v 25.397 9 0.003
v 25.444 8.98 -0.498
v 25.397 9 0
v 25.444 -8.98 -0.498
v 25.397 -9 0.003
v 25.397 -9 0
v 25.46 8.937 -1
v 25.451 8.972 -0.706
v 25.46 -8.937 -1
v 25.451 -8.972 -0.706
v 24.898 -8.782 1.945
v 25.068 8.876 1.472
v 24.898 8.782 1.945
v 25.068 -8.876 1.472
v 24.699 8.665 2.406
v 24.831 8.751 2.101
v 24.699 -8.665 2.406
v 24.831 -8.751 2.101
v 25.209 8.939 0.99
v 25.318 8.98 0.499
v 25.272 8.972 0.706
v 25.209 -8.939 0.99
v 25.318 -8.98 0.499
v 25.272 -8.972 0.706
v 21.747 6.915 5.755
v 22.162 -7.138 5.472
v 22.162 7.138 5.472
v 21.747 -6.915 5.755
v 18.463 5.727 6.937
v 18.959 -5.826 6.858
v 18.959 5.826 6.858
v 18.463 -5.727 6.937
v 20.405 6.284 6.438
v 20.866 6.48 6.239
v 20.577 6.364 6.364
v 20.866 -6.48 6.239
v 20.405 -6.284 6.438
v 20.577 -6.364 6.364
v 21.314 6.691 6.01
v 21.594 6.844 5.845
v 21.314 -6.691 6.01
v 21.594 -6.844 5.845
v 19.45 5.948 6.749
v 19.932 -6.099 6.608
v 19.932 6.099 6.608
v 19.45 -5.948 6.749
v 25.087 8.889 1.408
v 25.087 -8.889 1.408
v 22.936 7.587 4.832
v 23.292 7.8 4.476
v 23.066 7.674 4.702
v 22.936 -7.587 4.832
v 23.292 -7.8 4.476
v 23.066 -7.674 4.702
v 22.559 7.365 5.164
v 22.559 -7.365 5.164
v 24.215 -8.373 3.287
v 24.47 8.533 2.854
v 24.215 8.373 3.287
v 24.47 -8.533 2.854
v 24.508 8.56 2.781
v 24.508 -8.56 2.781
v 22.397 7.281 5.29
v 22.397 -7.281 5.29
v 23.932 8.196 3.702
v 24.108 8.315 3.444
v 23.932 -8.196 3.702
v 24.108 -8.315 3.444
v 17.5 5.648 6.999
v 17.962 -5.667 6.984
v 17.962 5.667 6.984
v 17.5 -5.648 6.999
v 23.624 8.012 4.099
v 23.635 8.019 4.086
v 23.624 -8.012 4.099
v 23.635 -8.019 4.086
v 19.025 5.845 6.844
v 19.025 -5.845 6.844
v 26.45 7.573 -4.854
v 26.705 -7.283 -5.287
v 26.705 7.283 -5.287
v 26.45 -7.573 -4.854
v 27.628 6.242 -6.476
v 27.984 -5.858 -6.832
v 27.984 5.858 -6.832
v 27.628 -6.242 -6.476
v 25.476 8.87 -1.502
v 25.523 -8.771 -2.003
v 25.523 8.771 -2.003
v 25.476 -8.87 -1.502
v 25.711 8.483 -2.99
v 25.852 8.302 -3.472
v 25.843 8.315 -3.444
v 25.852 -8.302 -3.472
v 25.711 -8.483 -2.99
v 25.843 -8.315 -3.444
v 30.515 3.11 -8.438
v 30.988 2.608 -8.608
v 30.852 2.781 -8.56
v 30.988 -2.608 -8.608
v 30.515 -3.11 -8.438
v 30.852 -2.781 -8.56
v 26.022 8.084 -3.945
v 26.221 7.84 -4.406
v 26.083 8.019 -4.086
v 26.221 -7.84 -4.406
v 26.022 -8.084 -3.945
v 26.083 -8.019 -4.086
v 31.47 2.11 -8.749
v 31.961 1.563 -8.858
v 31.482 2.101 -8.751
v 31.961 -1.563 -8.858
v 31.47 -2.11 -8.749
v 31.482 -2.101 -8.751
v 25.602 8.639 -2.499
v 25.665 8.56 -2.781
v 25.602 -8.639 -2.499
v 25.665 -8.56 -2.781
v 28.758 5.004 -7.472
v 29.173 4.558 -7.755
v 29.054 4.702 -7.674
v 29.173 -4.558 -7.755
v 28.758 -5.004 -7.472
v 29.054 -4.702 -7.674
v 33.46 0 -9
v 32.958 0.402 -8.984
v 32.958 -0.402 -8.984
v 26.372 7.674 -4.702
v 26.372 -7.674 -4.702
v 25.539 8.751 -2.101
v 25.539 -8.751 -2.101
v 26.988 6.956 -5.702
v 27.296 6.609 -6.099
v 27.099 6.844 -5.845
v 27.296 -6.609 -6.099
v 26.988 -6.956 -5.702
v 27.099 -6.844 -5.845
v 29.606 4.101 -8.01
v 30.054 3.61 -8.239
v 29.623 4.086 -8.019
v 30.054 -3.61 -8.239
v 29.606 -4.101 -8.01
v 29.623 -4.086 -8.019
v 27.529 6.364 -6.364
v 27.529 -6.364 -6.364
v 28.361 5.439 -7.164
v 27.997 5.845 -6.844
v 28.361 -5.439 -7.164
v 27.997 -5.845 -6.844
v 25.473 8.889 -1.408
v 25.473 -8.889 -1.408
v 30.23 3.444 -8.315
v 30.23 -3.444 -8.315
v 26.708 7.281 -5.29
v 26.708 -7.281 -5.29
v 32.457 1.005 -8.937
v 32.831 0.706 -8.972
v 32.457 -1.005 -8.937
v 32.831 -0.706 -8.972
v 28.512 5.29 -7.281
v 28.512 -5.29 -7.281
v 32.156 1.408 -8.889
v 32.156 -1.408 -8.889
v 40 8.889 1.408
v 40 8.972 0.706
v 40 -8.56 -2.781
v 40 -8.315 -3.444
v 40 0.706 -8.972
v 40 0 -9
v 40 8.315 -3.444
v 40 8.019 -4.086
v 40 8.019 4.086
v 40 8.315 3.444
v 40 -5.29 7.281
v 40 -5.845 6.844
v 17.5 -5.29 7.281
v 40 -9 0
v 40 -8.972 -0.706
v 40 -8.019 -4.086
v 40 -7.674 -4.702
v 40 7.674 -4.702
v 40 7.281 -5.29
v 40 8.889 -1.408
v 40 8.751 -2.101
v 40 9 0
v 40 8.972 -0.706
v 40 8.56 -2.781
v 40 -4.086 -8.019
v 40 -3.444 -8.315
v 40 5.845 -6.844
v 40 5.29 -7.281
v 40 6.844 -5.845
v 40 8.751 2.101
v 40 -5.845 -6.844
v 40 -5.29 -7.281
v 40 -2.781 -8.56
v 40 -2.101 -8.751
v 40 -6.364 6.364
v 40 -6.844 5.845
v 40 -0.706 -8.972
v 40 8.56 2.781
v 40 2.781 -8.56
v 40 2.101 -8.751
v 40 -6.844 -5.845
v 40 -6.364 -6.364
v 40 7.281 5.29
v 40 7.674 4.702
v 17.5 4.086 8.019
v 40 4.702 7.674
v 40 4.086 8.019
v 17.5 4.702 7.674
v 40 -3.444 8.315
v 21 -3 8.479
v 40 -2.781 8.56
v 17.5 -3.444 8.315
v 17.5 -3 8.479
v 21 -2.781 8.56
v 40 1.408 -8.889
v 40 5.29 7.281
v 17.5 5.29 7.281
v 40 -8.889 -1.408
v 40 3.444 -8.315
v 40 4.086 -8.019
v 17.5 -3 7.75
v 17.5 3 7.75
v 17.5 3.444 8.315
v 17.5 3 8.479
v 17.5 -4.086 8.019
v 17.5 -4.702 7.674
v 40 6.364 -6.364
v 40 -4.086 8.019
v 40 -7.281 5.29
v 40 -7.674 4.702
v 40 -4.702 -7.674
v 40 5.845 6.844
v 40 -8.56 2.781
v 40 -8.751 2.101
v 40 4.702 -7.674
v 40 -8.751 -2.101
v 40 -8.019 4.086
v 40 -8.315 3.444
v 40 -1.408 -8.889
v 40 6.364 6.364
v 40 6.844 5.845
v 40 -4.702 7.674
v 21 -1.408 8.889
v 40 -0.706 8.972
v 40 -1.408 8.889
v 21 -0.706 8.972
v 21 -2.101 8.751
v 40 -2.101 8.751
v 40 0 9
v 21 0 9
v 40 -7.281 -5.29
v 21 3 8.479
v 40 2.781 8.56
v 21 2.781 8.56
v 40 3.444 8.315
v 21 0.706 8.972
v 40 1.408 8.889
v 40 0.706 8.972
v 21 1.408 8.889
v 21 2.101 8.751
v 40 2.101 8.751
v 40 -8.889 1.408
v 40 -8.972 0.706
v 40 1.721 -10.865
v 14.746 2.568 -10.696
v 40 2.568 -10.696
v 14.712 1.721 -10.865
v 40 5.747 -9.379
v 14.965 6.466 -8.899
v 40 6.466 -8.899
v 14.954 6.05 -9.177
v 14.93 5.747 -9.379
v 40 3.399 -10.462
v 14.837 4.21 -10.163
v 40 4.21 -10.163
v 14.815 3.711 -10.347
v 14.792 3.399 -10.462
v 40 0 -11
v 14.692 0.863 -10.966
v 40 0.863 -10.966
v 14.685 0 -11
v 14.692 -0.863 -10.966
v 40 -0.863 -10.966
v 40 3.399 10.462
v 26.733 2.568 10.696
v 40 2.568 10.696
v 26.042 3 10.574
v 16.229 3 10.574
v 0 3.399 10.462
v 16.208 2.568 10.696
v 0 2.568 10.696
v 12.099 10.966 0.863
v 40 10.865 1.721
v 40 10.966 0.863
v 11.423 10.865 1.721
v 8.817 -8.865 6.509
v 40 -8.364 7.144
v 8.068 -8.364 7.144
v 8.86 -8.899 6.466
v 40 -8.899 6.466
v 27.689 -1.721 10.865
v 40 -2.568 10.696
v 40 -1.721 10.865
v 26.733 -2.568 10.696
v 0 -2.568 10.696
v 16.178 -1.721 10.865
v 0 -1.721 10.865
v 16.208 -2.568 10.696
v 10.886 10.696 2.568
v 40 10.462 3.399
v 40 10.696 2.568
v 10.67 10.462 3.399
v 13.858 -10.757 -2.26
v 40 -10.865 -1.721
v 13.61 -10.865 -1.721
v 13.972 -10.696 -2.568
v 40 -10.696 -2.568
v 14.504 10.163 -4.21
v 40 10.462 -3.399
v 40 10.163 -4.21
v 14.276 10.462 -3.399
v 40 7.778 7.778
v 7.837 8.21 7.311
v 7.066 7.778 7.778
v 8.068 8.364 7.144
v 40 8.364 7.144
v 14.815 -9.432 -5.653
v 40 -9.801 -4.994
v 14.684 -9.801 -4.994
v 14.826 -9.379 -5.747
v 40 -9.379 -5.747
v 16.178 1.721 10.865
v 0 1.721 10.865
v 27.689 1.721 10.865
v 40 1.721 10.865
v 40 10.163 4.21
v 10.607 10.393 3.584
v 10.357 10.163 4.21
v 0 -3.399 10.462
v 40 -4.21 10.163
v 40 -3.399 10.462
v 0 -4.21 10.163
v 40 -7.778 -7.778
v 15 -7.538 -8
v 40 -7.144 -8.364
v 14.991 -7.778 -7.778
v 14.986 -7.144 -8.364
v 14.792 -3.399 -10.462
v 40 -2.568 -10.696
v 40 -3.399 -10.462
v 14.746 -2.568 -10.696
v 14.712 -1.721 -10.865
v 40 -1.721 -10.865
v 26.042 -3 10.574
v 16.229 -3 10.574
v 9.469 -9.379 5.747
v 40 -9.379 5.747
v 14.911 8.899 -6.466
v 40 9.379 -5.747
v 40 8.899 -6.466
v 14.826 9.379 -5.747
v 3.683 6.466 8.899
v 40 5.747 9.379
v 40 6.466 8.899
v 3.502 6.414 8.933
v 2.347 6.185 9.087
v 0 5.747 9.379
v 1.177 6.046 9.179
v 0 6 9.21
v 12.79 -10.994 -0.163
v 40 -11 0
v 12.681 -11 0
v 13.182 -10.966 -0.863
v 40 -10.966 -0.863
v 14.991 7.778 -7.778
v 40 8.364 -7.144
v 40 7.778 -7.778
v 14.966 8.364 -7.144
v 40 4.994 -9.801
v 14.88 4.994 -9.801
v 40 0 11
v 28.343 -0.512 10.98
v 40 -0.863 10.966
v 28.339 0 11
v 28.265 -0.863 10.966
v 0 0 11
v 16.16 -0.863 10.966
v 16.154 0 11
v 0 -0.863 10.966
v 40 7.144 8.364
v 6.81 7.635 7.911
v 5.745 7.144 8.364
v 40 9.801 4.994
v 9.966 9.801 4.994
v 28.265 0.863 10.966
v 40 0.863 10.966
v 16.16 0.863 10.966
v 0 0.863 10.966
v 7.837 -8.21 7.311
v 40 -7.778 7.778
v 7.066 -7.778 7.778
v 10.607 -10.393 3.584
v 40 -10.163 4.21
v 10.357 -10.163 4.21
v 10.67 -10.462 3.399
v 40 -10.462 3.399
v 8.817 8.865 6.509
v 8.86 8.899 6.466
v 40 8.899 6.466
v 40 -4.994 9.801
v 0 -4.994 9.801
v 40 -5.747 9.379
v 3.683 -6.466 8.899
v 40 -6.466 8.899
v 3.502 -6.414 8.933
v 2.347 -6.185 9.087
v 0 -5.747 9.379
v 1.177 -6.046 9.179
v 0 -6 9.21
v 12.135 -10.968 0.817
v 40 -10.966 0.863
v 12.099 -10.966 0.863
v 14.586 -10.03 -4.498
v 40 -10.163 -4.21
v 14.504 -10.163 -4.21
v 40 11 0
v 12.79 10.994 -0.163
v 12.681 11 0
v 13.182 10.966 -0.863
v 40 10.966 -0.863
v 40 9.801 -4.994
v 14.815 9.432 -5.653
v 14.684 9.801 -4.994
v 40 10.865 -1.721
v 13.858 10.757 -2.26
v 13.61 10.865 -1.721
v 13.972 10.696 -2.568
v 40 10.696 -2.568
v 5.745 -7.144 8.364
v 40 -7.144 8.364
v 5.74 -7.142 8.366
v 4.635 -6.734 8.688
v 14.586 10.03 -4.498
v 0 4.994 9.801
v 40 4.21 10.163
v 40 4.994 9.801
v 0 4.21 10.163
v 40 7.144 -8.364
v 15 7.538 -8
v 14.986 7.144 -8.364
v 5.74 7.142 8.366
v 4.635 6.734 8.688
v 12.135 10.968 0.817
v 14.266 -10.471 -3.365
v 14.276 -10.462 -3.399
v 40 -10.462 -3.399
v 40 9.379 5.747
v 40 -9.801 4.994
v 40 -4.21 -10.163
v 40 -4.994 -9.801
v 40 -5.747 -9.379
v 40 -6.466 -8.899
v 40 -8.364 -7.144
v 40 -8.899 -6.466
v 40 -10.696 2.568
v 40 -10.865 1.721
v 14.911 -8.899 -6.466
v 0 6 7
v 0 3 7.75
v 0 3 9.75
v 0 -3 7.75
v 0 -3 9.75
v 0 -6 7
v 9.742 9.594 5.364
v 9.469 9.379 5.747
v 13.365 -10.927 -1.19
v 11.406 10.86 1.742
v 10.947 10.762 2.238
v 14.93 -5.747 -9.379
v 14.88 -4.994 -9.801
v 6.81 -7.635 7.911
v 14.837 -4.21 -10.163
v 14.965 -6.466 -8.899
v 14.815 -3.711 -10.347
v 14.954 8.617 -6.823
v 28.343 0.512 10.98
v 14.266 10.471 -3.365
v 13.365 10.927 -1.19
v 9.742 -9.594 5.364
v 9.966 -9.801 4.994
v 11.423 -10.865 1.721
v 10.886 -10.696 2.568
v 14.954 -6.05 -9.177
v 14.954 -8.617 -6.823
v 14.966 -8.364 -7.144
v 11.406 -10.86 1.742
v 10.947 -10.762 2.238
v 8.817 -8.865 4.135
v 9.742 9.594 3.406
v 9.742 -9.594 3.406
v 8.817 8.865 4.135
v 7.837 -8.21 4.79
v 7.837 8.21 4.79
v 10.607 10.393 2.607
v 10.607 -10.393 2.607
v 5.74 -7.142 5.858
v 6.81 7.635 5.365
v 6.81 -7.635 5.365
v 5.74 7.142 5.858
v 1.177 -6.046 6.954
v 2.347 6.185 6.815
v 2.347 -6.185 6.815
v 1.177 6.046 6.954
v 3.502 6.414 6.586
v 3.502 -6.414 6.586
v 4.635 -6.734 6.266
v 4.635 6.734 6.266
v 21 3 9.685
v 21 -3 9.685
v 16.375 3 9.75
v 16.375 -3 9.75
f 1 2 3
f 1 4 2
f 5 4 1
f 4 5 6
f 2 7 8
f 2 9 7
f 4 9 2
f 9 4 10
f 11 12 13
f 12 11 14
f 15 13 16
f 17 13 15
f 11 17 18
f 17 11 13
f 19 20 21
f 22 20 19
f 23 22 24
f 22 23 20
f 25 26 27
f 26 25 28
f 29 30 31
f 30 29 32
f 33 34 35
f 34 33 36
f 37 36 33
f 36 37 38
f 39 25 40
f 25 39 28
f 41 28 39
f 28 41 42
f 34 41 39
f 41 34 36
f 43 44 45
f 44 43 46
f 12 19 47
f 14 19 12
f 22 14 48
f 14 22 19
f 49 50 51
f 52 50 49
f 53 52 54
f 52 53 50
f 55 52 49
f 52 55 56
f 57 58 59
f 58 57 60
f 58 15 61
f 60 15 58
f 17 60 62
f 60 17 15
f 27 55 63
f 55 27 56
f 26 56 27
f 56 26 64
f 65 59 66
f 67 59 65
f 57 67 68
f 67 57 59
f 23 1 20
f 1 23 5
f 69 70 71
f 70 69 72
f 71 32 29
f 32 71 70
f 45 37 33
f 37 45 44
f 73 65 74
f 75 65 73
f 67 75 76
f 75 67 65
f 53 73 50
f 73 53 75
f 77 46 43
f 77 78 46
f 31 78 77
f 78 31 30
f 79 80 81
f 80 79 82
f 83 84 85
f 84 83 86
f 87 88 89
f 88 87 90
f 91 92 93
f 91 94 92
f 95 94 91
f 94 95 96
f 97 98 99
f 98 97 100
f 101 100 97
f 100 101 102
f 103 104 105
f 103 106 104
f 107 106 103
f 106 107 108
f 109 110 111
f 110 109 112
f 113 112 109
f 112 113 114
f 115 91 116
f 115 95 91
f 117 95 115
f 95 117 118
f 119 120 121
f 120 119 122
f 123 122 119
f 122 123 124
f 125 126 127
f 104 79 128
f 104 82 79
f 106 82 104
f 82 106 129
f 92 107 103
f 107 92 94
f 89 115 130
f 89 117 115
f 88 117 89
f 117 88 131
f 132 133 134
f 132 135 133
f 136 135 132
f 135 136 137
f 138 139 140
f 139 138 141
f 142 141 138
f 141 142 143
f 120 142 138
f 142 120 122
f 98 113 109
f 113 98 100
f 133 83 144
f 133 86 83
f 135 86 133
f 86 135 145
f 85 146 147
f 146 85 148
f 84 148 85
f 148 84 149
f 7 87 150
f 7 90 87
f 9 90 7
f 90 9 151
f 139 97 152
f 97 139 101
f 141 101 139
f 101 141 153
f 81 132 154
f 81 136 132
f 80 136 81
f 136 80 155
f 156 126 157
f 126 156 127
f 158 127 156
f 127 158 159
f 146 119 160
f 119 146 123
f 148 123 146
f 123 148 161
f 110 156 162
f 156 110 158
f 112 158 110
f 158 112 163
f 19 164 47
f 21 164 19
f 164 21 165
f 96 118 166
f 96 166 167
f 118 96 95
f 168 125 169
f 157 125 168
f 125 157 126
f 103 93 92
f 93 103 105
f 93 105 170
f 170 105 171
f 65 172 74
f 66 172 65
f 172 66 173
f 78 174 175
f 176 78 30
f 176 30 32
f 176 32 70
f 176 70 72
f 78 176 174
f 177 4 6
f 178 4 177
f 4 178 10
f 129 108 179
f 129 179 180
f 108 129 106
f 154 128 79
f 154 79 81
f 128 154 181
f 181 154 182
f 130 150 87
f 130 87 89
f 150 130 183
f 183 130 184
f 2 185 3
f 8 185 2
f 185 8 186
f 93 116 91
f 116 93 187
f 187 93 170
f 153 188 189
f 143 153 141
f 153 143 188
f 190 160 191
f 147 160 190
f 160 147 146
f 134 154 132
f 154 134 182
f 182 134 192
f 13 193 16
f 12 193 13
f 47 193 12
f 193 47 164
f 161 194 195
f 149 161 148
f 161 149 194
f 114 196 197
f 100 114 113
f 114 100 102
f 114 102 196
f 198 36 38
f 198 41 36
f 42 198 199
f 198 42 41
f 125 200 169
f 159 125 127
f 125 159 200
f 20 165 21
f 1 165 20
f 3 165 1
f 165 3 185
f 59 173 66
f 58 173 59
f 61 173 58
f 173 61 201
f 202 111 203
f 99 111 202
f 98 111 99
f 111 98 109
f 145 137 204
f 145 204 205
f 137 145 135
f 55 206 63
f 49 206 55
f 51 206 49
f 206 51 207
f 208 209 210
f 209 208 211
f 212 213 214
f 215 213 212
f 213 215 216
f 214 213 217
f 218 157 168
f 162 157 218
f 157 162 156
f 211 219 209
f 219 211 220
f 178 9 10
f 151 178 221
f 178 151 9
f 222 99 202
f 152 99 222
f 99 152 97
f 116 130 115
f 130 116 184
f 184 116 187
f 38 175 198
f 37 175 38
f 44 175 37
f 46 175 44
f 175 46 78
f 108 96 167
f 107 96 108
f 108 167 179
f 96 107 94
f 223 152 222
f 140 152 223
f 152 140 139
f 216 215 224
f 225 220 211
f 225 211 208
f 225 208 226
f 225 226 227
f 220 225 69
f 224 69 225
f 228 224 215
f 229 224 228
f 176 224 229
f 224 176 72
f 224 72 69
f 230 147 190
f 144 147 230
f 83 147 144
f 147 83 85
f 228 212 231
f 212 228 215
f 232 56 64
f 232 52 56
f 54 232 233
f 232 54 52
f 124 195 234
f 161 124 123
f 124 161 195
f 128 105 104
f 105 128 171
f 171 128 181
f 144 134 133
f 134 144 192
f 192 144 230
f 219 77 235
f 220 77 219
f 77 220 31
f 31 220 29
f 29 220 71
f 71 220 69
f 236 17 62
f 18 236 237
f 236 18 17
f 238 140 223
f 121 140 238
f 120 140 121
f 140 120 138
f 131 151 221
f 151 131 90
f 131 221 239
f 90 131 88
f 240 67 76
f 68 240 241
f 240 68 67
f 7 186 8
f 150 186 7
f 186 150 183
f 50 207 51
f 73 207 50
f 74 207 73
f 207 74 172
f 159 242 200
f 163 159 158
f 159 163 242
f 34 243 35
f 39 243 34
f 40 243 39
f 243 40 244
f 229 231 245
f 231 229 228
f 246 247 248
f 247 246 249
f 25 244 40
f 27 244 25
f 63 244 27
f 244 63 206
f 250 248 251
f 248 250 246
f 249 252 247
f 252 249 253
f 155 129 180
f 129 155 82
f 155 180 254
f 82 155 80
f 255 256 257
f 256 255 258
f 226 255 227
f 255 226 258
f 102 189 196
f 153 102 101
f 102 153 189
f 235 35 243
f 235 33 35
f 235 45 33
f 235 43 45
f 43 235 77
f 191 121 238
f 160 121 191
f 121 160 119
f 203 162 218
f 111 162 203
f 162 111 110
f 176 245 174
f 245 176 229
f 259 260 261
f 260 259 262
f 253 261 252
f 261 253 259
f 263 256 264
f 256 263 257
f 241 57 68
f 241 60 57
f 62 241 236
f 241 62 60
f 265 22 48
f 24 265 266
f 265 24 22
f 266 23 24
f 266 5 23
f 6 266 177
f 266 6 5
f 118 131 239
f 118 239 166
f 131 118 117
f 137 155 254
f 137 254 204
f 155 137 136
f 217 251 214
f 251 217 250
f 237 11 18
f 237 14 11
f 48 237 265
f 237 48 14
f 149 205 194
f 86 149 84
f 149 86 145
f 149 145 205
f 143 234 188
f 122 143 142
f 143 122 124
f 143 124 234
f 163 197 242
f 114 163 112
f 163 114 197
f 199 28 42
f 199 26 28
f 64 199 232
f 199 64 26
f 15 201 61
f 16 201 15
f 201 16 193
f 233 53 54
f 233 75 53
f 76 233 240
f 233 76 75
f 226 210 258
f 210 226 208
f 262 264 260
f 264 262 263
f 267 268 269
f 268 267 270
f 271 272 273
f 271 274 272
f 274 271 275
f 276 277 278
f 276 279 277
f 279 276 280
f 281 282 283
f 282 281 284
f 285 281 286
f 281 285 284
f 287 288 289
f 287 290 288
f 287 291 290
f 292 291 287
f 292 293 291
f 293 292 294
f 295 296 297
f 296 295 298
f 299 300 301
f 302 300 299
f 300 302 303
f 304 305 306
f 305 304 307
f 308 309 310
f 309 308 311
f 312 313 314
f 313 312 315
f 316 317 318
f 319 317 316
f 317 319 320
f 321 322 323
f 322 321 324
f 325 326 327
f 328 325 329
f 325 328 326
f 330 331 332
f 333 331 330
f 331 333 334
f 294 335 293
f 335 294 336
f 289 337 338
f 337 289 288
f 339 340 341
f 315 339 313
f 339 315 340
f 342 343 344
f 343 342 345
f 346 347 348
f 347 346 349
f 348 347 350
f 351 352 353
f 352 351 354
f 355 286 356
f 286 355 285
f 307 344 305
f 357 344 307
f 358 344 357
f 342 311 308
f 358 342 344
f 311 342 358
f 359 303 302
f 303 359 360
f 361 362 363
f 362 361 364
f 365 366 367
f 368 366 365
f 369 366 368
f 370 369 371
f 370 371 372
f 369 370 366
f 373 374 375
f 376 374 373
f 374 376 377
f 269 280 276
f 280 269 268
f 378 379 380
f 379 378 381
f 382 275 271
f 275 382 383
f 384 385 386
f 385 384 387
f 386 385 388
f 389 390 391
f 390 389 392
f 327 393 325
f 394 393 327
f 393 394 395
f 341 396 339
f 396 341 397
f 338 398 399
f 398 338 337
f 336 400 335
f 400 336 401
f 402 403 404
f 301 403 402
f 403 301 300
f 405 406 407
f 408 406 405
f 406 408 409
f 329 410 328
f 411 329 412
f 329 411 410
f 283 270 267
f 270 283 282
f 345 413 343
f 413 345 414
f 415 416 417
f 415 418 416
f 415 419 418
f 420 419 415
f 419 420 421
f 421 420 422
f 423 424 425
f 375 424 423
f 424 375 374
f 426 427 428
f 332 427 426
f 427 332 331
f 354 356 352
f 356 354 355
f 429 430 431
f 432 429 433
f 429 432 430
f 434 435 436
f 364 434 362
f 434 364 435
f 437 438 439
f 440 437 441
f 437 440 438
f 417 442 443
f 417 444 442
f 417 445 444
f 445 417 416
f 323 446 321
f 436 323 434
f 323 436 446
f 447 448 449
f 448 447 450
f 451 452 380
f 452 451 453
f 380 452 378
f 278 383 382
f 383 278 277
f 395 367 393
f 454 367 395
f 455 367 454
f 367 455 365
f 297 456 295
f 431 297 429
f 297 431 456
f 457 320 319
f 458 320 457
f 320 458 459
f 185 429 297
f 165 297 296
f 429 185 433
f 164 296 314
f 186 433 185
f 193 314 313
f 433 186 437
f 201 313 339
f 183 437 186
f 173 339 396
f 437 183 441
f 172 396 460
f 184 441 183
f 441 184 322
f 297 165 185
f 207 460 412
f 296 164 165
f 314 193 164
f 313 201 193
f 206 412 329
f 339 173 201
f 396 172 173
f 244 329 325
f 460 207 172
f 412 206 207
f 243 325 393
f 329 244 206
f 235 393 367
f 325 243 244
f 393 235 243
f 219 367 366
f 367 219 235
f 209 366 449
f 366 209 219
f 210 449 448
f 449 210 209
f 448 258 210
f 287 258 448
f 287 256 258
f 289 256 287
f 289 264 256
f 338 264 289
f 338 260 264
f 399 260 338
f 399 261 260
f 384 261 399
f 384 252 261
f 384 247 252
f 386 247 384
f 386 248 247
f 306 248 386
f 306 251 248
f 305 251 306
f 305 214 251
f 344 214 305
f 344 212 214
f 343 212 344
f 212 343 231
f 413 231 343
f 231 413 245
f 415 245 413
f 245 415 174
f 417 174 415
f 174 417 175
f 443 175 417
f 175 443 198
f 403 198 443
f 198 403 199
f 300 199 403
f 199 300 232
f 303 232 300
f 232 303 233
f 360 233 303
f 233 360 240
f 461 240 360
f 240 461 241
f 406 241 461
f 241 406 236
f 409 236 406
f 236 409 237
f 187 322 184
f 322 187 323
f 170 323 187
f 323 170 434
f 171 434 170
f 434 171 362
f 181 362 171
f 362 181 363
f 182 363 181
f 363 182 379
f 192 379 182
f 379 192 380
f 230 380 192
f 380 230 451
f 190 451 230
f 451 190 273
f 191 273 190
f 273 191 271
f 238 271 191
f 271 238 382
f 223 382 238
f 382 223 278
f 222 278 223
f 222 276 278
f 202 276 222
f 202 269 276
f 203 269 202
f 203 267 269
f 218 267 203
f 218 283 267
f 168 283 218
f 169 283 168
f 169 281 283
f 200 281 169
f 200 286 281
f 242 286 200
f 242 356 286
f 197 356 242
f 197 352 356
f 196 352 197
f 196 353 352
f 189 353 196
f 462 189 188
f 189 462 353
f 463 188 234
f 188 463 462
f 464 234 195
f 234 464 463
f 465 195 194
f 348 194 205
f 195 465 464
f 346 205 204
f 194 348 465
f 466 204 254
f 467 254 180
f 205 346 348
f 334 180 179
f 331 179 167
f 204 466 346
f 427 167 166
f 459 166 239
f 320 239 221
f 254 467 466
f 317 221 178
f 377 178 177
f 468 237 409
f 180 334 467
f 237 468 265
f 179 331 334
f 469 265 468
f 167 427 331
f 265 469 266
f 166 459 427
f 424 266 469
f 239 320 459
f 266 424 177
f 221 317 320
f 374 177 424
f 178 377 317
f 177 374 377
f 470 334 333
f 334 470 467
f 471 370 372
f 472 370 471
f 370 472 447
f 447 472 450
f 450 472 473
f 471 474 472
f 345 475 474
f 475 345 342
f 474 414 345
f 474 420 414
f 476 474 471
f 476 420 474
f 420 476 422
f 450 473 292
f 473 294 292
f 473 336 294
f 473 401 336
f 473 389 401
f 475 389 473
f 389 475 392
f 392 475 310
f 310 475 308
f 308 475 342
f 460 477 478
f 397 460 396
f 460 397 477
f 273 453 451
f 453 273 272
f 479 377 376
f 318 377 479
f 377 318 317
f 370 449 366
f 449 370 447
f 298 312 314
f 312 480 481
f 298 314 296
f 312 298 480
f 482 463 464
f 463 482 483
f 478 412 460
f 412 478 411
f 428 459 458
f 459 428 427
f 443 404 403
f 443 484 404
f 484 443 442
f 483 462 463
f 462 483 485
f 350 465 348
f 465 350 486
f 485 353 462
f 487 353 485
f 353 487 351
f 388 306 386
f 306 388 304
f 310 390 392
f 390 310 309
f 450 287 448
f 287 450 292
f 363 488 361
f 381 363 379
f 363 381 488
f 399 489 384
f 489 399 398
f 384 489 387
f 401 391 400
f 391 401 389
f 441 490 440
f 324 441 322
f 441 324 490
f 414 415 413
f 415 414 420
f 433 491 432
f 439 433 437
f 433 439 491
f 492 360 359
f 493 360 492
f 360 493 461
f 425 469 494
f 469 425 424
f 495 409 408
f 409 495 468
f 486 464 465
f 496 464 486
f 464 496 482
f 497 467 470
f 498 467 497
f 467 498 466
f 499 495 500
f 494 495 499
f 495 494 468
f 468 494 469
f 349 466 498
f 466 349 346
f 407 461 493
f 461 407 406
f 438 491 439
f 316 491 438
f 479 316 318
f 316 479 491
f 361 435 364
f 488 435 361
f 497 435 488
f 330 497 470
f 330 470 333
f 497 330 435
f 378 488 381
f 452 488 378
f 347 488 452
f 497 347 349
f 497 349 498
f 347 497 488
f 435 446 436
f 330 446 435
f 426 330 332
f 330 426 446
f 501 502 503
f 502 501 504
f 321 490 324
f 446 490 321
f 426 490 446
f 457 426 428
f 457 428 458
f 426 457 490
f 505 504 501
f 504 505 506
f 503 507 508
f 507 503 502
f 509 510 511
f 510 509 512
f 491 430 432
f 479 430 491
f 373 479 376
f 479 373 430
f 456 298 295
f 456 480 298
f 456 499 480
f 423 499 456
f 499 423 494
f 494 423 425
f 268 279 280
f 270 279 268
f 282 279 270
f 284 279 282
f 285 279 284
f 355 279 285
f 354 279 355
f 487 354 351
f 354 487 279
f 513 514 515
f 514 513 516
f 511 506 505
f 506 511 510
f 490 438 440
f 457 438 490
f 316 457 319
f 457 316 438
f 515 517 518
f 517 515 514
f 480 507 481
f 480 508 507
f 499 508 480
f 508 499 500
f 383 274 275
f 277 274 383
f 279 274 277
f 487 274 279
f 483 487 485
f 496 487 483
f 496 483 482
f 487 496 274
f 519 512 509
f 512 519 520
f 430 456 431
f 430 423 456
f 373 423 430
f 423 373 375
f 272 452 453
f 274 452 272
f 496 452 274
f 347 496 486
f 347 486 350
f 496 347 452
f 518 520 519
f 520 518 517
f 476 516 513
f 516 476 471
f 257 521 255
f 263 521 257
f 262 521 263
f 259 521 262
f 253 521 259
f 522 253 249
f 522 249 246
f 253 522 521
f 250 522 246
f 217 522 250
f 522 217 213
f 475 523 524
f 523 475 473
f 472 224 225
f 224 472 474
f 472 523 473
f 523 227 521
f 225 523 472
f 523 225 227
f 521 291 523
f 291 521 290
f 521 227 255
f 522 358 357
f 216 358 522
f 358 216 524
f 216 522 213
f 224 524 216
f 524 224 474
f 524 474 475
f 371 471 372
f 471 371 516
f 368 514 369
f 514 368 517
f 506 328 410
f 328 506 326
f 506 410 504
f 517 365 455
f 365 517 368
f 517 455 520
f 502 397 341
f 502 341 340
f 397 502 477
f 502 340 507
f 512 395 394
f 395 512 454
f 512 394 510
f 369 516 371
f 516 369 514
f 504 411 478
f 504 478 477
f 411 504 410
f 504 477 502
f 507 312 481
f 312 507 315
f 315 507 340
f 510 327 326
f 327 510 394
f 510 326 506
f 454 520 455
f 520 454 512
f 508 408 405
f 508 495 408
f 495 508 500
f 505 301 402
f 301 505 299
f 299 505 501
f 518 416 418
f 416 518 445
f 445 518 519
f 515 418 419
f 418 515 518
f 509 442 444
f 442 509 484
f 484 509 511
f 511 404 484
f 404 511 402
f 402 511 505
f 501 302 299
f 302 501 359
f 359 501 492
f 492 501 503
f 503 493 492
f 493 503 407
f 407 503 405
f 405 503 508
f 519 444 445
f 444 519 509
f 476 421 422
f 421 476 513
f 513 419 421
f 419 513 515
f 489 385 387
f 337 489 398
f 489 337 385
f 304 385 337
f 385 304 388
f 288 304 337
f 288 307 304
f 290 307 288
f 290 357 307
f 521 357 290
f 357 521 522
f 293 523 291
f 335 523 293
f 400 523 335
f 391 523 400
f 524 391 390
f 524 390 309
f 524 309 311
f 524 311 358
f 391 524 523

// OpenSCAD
module fipple () {
	difference () {
		rotate([0,90,0]) cylinder(r=11, h=40, $fn=80);	// base
		translate([0,0,-8]) rotate([90,0,0]) cylinder(r=15, h=50, center=true, $fn=80);	// main lip c	utout	
		translate([0,0,8.75]) cube([42, 6, 2], center=true);	// air path
		translate([0,21,0]) cylinder(r=15, h=50, center=true, $fn=80);	// side cutouts
		translate([0,-21,0]) cylinder(r=15, h=50, center=true, $fn=80);
	
		translate([17.5,0,0]) difference () {	// interior bore
			rotate([0,90,0]) cylinder(r=9, h=50, $fn=80);	// main cylinder
			translate([-0.04,0,-1]) rotate([90,0,0]) interior_cutout(rad=8,h=50);	// curve at front
			*difference () {	// flat part at front to position the blade in the airstream
				translate([0,0,8]) cube([150,20,5], center=true);
				translate([0,0,-15]) rotate([0,-10,0]) cube([200,25,20], center=true);	// angled par	t to transition smoothly back into cylindrical	
			}	
		}
	
		translate([22, 0, 12.4]) rotate([0,-10,0]) cube([12, 6, 5], center=true);	// blade
	}
}

module interior_cutout (rad, h) {
		union () {
			intersection () {
				translate([0,0,-h/2]) cube([rad,rad,h]);
				cylinder(r=rad, h=h+1, center=true, $fn=100);
			}
			difference () {
				translate([0,-rad,-h/2]) cube([2*rad,rad,h]);
				translate([2*rad,0,0]) cylinder (r=rad, h=h+1, center=true, $fn=100);
			}
		}
}

fipple ();
